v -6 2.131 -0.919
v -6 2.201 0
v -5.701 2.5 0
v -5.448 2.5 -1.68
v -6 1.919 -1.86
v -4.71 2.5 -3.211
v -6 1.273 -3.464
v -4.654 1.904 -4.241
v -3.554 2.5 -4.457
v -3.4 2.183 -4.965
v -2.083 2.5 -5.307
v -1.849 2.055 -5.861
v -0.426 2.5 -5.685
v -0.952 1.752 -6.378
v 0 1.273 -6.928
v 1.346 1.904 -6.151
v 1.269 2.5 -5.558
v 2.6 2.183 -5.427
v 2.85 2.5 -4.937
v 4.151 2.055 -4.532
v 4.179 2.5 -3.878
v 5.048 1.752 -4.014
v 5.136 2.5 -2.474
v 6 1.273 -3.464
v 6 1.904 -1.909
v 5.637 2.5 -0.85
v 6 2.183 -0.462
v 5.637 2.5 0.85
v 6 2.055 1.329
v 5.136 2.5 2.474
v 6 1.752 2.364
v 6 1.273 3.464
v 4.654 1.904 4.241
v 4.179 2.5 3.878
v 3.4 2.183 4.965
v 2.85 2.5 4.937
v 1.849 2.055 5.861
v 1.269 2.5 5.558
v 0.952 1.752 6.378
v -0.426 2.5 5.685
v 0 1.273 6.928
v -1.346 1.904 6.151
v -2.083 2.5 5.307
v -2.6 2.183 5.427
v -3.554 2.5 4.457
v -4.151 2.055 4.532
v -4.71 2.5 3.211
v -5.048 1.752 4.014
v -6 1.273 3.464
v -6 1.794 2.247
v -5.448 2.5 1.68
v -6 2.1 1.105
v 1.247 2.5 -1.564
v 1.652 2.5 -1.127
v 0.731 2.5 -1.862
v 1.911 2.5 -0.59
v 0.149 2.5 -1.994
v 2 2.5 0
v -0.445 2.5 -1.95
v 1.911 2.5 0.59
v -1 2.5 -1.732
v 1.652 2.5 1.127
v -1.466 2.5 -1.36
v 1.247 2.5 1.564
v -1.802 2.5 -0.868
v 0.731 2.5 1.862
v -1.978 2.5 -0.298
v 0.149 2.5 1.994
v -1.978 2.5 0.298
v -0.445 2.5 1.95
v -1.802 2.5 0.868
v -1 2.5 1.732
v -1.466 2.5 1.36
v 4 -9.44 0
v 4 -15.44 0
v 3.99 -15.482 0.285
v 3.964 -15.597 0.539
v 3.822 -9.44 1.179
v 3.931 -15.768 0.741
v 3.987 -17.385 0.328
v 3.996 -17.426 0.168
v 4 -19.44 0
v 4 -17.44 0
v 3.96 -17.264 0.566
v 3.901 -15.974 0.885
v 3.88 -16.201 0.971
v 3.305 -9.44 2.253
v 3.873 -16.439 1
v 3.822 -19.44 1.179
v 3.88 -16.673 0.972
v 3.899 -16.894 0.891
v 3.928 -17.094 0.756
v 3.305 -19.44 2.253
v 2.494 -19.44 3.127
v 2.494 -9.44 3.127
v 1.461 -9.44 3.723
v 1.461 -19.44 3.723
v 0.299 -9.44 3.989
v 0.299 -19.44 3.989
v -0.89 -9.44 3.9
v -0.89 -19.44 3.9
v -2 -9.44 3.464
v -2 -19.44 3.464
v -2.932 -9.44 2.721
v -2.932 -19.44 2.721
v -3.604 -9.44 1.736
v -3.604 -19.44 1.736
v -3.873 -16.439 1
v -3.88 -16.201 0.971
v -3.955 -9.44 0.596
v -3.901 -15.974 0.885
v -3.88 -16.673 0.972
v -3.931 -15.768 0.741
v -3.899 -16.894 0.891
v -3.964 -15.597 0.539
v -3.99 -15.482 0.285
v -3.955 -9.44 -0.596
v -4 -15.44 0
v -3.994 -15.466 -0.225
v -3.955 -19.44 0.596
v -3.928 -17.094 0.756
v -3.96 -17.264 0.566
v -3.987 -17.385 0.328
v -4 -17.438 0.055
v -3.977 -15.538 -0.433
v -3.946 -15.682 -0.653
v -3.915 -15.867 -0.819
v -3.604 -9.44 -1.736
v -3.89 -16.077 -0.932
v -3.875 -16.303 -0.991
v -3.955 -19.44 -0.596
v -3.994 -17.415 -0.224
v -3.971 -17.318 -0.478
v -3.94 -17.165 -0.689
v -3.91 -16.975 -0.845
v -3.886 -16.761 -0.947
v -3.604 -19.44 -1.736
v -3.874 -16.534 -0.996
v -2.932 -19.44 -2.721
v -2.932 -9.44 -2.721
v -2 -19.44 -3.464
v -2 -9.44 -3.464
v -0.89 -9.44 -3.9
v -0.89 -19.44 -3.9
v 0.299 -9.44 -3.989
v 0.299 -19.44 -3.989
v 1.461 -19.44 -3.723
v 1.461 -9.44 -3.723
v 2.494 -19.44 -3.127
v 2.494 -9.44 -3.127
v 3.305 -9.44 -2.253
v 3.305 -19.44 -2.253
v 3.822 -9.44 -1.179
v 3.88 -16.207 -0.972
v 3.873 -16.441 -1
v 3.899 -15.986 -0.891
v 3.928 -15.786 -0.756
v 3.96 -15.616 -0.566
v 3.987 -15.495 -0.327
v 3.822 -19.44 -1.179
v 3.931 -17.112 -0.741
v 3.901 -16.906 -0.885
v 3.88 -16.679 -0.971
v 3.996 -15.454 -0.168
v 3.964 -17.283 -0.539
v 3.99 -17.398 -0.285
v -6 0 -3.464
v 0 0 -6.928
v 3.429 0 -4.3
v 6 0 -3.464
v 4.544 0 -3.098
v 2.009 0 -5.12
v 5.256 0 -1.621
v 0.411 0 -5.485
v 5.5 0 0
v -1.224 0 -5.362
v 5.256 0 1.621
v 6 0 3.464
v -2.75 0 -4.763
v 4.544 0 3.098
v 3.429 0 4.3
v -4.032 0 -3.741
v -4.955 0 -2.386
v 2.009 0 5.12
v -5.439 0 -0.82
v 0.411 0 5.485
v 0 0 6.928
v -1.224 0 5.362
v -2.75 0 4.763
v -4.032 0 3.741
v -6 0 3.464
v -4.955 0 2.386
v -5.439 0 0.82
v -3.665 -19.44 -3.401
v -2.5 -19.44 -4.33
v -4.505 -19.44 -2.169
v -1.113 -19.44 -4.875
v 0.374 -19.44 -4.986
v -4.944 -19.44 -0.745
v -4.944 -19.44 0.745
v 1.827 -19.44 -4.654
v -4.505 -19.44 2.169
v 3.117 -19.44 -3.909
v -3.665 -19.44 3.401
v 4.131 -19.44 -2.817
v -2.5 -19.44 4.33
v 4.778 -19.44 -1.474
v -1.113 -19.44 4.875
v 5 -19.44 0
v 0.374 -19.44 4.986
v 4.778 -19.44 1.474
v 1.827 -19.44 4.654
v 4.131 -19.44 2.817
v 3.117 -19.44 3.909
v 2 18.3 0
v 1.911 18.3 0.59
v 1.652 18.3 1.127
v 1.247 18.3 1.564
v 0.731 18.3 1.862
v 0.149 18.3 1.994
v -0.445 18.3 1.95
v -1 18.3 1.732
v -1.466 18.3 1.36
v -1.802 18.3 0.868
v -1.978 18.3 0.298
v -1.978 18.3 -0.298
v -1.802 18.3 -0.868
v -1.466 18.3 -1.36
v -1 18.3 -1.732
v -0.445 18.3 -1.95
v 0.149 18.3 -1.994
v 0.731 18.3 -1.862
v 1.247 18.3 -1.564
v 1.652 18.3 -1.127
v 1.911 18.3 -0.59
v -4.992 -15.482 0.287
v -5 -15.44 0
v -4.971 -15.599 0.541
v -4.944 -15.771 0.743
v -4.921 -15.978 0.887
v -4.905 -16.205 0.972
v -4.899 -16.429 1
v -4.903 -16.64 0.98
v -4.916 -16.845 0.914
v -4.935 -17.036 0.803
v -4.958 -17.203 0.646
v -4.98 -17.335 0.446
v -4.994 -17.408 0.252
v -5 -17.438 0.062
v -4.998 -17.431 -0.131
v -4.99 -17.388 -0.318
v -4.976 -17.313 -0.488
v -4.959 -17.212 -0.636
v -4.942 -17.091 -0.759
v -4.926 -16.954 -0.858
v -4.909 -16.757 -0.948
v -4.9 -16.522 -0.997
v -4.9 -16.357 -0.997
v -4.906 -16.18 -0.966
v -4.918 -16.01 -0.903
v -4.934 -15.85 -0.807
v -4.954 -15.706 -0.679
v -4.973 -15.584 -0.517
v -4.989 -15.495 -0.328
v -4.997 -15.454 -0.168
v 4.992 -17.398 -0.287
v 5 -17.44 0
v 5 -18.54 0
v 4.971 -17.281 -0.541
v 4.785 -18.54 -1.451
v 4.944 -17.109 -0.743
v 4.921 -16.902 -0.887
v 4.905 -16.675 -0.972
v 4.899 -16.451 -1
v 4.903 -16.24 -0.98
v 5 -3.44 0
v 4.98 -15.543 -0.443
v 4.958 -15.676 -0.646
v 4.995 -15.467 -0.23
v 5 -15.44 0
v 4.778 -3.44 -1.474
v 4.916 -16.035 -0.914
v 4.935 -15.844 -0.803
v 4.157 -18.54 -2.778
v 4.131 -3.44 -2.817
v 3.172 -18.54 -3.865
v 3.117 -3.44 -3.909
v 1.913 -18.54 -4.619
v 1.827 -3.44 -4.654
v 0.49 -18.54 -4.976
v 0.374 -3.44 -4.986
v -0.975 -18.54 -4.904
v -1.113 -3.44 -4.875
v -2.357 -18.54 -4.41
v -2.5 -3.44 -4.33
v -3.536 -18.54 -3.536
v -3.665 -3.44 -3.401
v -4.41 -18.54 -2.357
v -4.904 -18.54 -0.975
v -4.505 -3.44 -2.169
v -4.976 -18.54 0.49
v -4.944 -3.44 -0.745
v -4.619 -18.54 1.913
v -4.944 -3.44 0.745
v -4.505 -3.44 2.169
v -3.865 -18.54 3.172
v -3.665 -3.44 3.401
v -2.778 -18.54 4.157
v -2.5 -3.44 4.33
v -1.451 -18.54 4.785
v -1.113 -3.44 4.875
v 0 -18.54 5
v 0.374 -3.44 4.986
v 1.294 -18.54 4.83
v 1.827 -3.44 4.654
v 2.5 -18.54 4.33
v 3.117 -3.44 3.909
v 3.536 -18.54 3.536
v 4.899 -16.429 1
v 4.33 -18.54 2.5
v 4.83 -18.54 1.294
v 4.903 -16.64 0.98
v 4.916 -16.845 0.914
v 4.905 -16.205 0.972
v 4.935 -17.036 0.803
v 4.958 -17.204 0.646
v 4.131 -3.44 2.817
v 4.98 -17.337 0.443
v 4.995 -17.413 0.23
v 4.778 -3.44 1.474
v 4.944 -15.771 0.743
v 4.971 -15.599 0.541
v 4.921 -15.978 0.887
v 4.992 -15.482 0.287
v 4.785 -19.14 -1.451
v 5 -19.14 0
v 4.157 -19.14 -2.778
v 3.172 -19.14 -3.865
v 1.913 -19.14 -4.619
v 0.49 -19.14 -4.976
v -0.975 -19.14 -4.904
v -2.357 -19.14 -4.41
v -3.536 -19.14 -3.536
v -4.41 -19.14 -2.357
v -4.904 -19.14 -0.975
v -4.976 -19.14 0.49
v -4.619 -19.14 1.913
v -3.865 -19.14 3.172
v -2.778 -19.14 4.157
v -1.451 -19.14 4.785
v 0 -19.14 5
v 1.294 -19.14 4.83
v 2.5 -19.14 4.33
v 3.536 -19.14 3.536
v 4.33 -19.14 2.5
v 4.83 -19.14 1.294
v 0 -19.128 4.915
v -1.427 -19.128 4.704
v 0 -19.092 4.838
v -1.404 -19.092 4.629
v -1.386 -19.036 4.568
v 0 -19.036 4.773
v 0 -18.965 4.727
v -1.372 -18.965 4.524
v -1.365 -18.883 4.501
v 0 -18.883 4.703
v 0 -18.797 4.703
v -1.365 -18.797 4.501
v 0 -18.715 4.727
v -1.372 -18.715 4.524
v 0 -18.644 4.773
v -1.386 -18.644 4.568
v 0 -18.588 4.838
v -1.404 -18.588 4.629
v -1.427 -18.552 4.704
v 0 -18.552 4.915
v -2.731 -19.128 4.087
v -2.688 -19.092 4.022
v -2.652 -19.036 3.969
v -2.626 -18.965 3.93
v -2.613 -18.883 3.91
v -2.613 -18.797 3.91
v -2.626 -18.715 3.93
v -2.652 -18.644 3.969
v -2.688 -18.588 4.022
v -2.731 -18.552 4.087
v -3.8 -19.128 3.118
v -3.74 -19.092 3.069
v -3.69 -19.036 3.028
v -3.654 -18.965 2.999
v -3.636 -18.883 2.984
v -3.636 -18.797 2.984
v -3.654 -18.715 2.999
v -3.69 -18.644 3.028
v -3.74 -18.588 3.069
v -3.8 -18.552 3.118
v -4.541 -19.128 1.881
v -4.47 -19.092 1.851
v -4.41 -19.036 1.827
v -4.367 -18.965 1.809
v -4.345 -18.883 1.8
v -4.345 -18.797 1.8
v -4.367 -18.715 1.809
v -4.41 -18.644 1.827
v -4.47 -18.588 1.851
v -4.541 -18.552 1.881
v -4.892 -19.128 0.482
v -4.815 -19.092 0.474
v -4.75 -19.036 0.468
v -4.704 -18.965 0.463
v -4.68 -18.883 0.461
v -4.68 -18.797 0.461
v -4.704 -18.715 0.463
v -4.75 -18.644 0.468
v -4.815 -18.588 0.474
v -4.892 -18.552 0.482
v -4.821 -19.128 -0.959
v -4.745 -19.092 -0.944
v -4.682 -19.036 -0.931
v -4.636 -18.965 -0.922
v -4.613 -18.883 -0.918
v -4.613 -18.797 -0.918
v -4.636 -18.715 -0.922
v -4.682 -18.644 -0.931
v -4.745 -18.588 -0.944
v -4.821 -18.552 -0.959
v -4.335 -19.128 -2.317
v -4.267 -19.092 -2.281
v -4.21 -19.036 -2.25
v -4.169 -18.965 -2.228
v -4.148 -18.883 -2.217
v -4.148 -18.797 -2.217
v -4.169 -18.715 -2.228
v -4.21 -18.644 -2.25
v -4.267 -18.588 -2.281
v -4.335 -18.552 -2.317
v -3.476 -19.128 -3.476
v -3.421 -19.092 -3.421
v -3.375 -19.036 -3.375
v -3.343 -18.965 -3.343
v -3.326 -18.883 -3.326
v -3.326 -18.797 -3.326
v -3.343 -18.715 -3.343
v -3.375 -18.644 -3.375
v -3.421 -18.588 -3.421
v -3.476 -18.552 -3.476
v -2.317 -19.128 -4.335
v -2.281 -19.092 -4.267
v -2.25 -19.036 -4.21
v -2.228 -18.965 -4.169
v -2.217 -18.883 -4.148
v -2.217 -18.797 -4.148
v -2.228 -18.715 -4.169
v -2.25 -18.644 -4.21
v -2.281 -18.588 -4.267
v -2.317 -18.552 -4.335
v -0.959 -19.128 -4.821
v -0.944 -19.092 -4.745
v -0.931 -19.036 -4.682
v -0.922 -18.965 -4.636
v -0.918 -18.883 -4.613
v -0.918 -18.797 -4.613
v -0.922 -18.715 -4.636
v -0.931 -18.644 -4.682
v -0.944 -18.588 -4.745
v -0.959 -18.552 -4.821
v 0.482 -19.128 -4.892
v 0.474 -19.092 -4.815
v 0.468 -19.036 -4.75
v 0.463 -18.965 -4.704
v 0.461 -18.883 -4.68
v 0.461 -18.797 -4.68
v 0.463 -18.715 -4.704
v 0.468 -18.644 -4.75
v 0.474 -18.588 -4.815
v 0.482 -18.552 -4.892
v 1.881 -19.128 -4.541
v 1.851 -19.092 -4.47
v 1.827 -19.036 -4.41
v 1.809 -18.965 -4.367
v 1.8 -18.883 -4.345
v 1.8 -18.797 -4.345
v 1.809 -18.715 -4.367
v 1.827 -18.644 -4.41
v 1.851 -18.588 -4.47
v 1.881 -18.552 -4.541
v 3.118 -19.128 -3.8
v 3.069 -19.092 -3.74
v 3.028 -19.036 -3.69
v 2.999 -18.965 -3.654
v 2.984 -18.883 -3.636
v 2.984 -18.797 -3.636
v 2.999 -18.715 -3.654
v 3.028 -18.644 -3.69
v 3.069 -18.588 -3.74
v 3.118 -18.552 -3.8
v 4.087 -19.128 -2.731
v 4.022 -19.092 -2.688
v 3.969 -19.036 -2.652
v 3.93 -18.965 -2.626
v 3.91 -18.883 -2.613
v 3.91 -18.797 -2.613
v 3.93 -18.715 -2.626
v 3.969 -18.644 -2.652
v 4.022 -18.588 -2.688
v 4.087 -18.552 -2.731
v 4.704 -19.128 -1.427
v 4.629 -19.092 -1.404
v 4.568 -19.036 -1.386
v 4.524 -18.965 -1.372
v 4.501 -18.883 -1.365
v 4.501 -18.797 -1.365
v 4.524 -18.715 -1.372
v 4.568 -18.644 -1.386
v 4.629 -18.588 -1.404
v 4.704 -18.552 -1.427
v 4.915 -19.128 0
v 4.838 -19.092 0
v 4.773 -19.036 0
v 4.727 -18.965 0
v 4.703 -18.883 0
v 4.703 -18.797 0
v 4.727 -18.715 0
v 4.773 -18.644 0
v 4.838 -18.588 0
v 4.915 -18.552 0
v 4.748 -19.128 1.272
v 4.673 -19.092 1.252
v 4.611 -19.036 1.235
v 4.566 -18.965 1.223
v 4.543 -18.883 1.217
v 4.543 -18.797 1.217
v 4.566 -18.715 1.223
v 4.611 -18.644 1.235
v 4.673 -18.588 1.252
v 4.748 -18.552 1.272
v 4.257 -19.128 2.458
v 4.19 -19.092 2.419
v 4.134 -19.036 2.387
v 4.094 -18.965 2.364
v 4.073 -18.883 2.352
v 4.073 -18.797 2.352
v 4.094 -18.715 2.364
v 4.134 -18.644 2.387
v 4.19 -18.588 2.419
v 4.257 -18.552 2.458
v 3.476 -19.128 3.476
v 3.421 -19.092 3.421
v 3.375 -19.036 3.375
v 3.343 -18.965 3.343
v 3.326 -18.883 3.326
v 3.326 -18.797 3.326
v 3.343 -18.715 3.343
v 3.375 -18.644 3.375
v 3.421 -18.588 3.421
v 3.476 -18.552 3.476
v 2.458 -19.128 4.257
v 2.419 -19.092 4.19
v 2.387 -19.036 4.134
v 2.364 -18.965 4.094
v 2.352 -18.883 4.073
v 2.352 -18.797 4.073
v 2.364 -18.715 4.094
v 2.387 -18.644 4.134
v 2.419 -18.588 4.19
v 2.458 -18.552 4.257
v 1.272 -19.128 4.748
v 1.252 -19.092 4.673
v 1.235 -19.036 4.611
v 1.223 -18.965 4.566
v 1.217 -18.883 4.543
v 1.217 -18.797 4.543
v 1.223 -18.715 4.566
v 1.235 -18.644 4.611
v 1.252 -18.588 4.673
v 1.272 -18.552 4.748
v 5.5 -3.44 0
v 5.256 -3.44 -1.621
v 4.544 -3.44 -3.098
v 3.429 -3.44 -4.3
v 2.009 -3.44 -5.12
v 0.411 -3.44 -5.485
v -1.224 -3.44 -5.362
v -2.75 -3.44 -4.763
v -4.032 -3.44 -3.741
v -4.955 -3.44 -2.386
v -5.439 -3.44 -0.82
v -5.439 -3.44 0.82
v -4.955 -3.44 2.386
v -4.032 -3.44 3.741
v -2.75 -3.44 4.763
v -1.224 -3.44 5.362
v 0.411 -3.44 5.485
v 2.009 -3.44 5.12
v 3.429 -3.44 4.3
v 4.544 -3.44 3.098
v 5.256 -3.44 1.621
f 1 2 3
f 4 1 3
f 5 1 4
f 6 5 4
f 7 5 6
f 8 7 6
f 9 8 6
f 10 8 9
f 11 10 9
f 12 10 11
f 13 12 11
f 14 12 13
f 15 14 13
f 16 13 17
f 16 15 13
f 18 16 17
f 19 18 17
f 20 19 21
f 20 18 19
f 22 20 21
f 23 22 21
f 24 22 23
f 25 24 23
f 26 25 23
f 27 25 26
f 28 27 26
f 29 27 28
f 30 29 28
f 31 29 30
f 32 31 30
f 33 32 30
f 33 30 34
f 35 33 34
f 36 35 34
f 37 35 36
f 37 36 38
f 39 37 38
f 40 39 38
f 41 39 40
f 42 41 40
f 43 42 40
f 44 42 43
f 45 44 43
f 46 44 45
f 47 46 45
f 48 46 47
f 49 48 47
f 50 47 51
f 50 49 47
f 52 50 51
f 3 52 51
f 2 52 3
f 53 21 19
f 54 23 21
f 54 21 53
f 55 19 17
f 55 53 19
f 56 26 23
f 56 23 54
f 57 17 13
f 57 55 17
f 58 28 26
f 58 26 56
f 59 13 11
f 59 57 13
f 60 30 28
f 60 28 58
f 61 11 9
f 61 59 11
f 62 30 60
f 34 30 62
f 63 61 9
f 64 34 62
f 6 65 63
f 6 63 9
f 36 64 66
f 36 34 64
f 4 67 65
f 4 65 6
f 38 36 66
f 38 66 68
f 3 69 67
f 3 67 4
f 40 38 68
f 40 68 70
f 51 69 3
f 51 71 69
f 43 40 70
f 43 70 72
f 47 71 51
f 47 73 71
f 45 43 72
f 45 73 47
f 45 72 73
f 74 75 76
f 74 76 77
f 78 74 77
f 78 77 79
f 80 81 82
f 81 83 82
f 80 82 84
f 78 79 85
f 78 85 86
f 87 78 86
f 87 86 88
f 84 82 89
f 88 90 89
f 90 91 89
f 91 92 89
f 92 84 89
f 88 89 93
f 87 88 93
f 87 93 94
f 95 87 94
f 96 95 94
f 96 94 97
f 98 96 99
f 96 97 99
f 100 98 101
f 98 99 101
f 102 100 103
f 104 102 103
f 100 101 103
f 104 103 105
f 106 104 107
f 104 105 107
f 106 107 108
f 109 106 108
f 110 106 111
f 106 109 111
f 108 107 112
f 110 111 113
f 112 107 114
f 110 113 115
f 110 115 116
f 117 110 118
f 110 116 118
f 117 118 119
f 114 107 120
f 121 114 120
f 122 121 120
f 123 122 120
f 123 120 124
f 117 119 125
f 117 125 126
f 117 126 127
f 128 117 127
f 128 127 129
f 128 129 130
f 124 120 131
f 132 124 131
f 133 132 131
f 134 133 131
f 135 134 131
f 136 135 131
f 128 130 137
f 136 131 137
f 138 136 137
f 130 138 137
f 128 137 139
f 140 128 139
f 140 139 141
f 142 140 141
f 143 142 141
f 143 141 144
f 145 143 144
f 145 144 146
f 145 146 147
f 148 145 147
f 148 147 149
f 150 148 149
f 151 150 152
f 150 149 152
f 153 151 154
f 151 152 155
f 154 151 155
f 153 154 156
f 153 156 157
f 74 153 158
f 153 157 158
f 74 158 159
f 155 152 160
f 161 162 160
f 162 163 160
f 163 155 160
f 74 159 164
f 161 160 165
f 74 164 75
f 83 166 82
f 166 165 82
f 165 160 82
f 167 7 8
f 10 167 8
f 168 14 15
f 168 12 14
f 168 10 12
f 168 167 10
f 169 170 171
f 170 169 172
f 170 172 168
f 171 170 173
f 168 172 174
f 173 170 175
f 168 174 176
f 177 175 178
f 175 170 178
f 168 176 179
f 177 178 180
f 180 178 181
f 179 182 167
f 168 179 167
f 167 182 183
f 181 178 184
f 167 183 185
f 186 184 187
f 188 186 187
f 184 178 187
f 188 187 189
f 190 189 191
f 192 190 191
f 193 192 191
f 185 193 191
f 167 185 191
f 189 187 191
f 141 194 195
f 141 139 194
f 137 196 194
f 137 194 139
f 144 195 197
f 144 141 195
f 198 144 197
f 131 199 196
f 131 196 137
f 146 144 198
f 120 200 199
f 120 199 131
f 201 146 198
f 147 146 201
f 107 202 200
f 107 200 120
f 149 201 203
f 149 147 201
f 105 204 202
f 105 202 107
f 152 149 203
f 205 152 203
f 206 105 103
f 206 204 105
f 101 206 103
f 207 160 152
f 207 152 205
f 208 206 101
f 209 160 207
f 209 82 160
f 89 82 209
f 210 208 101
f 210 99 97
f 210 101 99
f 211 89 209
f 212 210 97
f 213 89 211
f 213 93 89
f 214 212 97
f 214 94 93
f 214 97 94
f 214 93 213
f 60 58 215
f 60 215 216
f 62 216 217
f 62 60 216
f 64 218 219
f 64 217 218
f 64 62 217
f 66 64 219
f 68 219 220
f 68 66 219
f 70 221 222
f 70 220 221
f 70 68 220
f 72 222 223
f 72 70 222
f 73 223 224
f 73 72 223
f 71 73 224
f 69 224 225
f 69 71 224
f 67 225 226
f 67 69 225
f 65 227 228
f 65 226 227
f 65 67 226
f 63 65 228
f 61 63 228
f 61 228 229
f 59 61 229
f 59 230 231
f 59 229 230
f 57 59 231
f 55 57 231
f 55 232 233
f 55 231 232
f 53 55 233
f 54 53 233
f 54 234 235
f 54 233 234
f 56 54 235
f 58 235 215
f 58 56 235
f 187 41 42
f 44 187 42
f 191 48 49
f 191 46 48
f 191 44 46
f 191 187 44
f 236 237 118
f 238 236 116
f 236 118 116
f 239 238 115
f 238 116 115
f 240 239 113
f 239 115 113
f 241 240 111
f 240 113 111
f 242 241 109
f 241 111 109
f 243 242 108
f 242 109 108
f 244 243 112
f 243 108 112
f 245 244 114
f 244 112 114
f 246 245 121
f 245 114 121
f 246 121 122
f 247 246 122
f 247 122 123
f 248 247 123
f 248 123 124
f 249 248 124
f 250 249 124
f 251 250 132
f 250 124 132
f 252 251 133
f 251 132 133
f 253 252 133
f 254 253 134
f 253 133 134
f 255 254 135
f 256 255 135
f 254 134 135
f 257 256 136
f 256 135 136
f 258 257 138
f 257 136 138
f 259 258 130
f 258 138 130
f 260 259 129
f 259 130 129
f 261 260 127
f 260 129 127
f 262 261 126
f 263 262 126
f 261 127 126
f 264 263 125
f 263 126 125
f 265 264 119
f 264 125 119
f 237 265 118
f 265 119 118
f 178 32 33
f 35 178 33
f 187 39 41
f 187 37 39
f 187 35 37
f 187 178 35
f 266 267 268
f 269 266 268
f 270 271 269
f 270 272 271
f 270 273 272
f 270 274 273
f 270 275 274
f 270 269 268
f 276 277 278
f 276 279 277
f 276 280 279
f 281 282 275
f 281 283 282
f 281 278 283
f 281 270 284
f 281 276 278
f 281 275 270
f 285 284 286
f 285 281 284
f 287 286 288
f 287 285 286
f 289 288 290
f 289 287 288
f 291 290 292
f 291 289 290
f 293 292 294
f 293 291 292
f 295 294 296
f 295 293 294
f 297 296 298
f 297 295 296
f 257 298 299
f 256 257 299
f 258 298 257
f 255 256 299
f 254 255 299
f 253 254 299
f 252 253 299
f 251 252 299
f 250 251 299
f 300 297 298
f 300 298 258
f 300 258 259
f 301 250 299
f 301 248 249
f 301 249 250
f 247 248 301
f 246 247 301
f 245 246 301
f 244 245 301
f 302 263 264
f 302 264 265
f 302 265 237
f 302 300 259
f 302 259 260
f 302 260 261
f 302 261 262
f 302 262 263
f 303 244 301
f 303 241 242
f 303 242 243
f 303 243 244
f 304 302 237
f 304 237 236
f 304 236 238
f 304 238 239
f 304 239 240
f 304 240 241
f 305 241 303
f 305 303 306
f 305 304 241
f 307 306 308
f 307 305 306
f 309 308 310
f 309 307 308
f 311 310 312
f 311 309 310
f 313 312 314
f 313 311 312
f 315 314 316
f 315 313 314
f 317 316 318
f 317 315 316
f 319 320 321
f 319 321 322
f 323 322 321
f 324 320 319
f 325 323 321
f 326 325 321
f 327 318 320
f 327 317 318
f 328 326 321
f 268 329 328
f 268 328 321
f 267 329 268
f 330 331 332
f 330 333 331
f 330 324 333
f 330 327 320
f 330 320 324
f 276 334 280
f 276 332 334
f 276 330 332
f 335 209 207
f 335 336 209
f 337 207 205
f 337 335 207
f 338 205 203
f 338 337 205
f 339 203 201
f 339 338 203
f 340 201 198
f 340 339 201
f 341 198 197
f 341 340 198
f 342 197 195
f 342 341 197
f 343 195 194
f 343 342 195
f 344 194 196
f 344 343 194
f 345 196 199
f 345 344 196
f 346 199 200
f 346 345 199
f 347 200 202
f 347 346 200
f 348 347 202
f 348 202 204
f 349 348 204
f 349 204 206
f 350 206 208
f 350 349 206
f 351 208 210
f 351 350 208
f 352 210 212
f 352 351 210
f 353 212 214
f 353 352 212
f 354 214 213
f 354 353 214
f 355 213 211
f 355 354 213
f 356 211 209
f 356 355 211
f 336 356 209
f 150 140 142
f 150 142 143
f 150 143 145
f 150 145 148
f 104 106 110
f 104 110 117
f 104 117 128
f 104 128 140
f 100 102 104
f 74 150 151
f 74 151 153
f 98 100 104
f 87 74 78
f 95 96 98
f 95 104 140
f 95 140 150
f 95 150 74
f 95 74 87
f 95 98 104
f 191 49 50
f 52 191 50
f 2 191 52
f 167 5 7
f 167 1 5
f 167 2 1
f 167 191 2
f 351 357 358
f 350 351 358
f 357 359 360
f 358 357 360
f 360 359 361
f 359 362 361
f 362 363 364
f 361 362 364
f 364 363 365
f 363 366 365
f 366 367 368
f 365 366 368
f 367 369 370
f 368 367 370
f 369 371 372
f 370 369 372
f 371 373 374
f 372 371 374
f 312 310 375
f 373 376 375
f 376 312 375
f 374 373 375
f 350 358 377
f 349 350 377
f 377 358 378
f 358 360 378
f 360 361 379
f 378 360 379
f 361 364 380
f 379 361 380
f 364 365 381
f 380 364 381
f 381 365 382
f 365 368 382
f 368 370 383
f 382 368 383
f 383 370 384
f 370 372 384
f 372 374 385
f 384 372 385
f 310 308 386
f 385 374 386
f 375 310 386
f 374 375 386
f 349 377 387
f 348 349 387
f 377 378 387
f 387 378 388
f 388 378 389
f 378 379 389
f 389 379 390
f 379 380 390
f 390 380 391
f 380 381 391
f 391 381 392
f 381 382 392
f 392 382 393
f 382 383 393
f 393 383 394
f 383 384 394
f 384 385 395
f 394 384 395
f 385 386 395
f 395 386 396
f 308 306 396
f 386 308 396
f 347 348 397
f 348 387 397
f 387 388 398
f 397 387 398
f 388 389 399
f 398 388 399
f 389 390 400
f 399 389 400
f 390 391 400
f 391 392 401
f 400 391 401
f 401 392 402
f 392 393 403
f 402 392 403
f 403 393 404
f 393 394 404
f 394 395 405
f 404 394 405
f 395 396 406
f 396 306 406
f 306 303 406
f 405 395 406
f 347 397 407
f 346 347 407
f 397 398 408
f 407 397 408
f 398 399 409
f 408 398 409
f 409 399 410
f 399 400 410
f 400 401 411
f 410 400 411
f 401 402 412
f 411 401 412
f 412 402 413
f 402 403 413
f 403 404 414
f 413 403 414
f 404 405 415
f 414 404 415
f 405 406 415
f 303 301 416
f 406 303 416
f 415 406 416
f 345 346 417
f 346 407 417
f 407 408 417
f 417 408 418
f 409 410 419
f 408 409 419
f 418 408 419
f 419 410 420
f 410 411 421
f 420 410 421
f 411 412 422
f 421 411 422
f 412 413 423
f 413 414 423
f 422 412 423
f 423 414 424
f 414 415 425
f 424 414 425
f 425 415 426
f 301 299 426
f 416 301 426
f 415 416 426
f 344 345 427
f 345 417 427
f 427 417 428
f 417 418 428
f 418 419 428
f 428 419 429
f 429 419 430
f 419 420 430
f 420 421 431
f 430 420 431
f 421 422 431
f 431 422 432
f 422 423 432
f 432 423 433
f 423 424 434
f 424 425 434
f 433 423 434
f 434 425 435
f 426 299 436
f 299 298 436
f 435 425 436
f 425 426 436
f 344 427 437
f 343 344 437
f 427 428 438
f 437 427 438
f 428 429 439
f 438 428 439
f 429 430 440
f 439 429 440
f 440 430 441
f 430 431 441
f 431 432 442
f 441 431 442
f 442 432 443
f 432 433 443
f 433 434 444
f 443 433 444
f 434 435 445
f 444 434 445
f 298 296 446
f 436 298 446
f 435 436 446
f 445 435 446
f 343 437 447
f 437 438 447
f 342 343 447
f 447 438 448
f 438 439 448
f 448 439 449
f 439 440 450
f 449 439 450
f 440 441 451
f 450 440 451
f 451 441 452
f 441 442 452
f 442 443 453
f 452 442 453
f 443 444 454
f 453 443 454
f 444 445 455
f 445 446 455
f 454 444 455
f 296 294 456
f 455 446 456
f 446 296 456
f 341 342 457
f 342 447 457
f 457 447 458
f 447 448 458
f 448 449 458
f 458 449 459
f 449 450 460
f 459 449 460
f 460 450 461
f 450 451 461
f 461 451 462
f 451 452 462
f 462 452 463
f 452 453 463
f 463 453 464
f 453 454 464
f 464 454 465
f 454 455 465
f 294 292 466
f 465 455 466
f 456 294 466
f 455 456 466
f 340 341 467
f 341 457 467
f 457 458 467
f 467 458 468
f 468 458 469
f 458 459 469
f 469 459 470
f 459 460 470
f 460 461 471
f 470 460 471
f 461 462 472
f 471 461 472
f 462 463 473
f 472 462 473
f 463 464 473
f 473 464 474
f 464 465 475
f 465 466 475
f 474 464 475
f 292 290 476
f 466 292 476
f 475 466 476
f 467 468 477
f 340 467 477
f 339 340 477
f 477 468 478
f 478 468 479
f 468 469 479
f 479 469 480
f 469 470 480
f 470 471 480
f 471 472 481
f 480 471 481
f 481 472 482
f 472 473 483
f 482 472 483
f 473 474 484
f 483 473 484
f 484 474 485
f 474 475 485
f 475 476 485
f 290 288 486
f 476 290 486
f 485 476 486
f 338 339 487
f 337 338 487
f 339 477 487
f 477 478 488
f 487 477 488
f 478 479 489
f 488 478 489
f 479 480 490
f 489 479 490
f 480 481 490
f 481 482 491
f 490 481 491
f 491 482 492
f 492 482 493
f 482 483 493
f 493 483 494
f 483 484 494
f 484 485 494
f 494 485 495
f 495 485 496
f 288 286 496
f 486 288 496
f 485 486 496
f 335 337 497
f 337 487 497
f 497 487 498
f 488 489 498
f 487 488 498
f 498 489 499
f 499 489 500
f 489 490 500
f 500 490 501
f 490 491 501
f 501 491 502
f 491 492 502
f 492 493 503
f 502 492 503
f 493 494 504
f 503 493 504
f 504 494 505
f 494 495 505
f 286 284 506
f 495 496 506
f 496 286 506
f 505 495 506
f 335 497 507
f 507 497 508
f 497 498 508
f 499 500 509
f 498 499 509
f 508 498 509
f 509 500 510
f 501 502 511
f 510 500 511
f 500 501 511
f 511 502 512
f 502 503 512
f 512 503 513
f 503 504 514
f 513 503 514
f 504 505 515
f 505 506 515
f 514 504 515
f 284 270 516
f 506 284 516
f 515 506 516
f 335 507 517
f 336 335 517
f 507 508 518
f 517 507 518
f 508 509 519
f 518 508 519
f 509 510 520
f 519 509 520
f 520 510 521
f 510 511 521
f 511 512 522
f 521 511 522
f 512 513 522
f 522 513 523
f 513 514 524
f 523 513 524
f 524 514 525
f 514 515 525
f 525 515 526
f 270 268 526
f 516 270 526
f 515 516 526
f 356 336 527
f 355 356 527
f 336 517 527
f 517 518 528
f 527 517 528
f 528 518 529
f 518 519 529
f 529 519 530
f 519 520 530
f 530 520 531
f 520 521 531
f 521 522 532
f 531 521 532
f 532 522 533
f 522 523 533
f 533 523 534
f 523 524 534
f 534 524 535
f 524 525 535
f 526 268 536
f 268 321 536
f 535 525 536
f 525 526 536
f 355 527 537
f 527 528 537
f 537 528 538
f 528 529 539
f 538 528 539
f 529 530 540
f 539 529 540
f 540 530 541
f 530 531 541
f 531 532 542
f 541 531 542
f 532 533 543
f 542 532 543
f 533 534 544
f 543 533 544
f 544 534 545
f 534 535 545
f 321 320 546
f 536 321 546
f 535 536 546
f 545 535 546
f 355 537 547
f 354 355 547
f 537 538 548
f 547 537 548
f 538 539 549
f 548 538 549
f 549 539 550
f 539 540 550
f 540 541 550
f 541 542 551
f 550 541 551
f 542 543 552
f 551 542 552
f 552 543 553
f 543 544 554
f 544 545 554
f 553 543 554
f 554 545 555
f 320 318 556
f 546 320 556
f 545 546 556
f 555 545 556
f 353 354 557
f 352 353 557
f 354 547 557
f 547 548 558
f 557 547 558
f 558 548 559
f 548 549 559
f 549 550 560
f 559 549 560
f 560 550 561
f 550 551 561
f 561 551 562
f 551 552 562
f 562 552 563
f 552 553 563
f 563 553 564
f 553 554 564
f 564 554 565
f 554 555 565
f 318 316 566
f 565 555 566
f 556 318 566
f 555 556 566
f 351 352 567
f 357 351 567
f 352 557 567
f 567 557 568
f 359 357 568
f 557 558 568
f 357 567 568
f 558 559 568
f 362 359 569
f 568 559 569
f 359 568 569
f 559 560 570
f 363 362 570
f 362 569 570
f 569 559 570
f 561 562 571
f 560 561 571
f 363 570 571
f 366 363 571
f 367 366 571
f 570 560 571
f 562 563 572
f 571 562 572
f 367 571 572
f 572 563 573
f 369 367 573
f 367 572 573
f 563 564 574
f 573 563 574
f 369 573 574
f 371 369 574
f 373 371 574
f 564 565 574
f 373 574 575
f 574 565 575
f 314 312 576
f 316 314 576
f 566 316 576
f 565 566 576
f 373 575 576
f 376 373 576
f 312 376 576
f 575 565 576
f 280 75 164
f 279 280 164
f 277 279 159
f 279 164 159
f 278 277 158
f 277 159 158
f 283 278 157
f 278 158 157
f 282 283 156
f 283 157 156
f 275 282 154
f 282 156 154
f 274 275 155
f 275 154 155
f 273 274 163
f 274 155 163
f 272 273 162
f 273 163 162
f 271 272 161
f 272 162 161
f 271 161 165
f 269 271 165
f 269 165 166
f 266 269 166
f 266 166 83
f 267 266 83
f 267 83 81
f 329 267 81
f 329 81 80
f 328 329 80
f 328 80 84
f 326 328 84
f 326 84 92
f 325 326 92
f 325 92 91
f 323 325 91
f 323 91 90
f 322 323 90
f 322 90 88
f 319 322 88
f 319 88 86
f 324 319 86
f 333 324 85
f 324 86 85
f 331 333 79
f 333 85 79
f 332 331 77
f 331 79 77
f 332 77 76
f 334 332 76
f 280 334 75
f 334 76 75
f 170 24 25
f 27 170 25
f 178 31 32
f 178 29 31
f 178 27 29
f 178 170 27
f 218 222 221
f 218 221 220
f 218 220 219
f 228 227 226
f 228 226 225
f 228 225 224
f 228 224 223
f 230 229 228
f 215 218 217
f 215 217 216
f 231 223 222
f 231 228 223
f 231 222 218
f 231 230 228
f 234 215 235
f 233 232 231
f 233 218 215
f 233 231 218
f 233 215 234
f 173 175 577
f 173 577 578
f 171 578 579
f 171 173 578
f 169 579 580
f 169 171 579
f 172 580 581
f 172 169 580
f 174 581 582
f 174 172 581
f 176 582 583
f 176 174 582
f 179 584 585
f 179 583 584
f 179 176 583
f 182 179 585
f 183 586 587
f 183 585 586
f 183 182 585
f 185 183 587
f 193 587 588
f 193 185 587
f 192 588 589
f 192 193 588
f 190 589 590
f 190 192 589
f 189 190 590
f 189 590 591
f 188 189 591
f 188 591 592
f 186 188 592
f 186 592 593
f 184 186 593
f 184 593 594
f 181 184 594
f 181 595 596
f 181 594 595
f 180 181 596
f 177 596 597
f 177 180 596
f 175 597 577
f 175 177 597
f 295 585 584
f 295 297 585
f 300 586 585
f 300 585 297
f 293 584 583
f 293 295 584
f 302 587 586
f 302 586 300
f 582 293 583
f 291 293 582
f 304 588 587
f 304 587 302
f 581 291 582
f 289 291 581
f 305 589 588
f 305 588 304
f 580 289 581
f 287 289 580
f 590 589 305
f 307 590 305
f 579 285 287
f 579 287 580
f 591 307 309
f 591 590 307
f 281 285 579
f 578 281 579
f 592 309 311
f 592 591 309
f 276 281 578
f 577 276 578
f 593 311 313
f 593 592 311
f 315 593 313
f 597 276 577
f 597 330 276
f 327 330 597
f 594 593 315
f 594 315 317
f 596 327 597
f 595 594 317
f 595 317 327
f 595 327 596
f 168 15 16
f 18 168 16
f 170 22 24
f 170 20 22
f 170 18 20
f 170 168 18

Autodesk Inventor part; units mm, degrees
ref_plane "YZ Plane" through (0, 0, 0) normal (1, 0, 0) x (0, 1, 0)
ref_plane "XZ Plane" through (0, 0, 0) normal (0, 1, 0) x (-1, 0, 0)
ref_plane "XY Plane" through (0, 0, 0) normal (0, 0, 1) x (1, 0, 0)
sketch "Sketch1" plane through (0, 0, 0) normal (0, 1, 0) x (-1, 0, 0)
  line L0 (0, -6.9282) -> (-6, -3.4641)
  line L1 (-6, -3.4641) -> (-6, 3.4641)
  line L2 (-6, 3.4641) -> (0, 6.9282)
  line L3 (0, 6.9282) -> (6, 3.4641)
  line L4 (6, 3.4641) -> (6, -3.4641)
  line L5 (6, -3.4641) -> (0, -6.9282)
  point P0 (0, 0)
  point P1 (0, 0)
  dimension "d0" = 12
extrude "Extrusion1" add sketch "Sketch1" along normal blind 2.5
sketch "Sketch2" plane through (0, 2.5, 0) normal (0, 1, 0) x (1, 0, 0)
  circle A0 centre (0, 0) radius 2
  dimension "d3" = 4
extrude "Extrusion2" add sketch "Sketch2" along normal blind 15.8
thread "Thread1" size "M4x0.7" class "6g" standard "ANSI Metric M Profile" length 8
sketch "Sketch3" plane through (0, 0, 0) normal (0, -1, 0) x (1, 0, 0)
  circle A0 centre (0, 0) radius 5.5
  dimension "d8" = 11
extrude "Extrusion3" add sketch "Sketch3" along normal blind 3.44
sketch "Sketch4" plane through (0, -3.44, 0) normal (0, -1, 0) x (1, 0, 0)
  circle A0 centre (0, 0) radius 5.5 projected
  circle A1 centre (0, 0) radius 5
  dimension "d11" = 10
extrude "Extrusion4" add sketch "Sketch4" along normal blind 16 contours A1
sketch "Sketch5" plane through (0, -19.44, 0) normal (0, -1, 0) x (1, 0, 0)
  circle A0 centre (0, 0) radius 5 projected
  circle A1 centre (0, 0) radius 4
  dimension "d14" = 8
extrude "Extrusion5" cut sketch "Sketch5" against normal blind 10 contours A1
sketch "Sketch6" plane through (0, 0, 0) normal (1, 0, 0) x (0, 1, 0)
  circle A0 centre (-16.44, 0) radius 1
  line L0 (-19.44, -4) -> (-19.44, 4) projected
  point P0 (0, 0)
  dimension "d17" = 2
  dimension "d18" = 3
extrude "Extrusion6" cut sketch "Sketch6" along normal mid plane 14
sketch "Sketch7" plane through (0, 0, 0) normal (1, 0, 0) x (0, 1, 0)
  line L0 (2.5, -6.9282) -> (0, -6.9282) construction
  line L1 (0, -6.9282) -> (0, -5.5) construction
  line L2 (0, -5.5) -> (-3.44, -5.5) construction
  line L3 (-3.44, -5.5) -> (-3.44, -5) construction
  line L4 (-3.44, -5) -> (-19.44, -5) construction
  line L5 (-19.44, -5) -> (-19.44, -4) construction
  line L6 (-19.44, -4) -> (-9.44, -4) construction
  line L7 (-9.44, -4) -> (-9.44, 4) construction
  line L8 (-9.44, 4) -> (-19.44, 4) construction
  line L9 (-19.44, 4) -> (-19.44, 5) construction
  line L10 (-19.44, 5) -> (-3.44, 5) construction
  line L11 (-3.44, 5) -> (-3.44, 5.5) construction
  line L12 (-3.44, 5.5) -> (0, 5.5) construction
  line L13 (0, 5.5) -> (0, 6.9282) construction
  line L14 (0, 6.9282) -> (2.5, 6.9282) construction
  line L15 (2.5, 6.9282) -> (2.5, 2) construction
  line L16 (2.5, 2) -> (18.3, 2) construction
  line L17 (18.3, 2) -> (18.3, -2) construction
  line L18 (18.3, -2) -> (2.5, -2) construction
  line L19 (2.5, -2) -> (2.5, -6.9282) construction
  circle A0 centre (-18.84, 5) radius 0.3
  line L20 (-19.44, -4) -> (-19.44, 4) projected
  line L21 (-26.988, 0) -> (25.848, 0) projected
  point P0 (0, 0)
  dimension "d21" = 0.6
  dimension "d22" = 0.6
revolve "Revolution1" cut sketch "Sketch7" angle 360 about axis through (0, -10, 0) along (0, 1, 0)
sketch "Sketch8" plane through (0, 0, 0) normal (0, 0, 1) x (1, 0, 0)
  line L0 (-5.078, 3.1229) -> (-8.0424, 0.1585)
  line L1 (-8.0424, 0.1585) -> (-8.4208, 3.1229)
  line L2 (-8.4208, 3.1229) -> (-5.078, 3.1229)
  line L3 (-6, 2.5) -> (0, 2.5) projected
  line L4 (0, -26.988) -> (0, 25.848) projected
  point P0 (0, 0)
  dimension "d24" = 45
revolve "Revolution2" cut sketch "Sketch8" angle 360 about axis through (0, -10, 0) along (0, 1, 0)
properties part number "500-126" material "Steel"
